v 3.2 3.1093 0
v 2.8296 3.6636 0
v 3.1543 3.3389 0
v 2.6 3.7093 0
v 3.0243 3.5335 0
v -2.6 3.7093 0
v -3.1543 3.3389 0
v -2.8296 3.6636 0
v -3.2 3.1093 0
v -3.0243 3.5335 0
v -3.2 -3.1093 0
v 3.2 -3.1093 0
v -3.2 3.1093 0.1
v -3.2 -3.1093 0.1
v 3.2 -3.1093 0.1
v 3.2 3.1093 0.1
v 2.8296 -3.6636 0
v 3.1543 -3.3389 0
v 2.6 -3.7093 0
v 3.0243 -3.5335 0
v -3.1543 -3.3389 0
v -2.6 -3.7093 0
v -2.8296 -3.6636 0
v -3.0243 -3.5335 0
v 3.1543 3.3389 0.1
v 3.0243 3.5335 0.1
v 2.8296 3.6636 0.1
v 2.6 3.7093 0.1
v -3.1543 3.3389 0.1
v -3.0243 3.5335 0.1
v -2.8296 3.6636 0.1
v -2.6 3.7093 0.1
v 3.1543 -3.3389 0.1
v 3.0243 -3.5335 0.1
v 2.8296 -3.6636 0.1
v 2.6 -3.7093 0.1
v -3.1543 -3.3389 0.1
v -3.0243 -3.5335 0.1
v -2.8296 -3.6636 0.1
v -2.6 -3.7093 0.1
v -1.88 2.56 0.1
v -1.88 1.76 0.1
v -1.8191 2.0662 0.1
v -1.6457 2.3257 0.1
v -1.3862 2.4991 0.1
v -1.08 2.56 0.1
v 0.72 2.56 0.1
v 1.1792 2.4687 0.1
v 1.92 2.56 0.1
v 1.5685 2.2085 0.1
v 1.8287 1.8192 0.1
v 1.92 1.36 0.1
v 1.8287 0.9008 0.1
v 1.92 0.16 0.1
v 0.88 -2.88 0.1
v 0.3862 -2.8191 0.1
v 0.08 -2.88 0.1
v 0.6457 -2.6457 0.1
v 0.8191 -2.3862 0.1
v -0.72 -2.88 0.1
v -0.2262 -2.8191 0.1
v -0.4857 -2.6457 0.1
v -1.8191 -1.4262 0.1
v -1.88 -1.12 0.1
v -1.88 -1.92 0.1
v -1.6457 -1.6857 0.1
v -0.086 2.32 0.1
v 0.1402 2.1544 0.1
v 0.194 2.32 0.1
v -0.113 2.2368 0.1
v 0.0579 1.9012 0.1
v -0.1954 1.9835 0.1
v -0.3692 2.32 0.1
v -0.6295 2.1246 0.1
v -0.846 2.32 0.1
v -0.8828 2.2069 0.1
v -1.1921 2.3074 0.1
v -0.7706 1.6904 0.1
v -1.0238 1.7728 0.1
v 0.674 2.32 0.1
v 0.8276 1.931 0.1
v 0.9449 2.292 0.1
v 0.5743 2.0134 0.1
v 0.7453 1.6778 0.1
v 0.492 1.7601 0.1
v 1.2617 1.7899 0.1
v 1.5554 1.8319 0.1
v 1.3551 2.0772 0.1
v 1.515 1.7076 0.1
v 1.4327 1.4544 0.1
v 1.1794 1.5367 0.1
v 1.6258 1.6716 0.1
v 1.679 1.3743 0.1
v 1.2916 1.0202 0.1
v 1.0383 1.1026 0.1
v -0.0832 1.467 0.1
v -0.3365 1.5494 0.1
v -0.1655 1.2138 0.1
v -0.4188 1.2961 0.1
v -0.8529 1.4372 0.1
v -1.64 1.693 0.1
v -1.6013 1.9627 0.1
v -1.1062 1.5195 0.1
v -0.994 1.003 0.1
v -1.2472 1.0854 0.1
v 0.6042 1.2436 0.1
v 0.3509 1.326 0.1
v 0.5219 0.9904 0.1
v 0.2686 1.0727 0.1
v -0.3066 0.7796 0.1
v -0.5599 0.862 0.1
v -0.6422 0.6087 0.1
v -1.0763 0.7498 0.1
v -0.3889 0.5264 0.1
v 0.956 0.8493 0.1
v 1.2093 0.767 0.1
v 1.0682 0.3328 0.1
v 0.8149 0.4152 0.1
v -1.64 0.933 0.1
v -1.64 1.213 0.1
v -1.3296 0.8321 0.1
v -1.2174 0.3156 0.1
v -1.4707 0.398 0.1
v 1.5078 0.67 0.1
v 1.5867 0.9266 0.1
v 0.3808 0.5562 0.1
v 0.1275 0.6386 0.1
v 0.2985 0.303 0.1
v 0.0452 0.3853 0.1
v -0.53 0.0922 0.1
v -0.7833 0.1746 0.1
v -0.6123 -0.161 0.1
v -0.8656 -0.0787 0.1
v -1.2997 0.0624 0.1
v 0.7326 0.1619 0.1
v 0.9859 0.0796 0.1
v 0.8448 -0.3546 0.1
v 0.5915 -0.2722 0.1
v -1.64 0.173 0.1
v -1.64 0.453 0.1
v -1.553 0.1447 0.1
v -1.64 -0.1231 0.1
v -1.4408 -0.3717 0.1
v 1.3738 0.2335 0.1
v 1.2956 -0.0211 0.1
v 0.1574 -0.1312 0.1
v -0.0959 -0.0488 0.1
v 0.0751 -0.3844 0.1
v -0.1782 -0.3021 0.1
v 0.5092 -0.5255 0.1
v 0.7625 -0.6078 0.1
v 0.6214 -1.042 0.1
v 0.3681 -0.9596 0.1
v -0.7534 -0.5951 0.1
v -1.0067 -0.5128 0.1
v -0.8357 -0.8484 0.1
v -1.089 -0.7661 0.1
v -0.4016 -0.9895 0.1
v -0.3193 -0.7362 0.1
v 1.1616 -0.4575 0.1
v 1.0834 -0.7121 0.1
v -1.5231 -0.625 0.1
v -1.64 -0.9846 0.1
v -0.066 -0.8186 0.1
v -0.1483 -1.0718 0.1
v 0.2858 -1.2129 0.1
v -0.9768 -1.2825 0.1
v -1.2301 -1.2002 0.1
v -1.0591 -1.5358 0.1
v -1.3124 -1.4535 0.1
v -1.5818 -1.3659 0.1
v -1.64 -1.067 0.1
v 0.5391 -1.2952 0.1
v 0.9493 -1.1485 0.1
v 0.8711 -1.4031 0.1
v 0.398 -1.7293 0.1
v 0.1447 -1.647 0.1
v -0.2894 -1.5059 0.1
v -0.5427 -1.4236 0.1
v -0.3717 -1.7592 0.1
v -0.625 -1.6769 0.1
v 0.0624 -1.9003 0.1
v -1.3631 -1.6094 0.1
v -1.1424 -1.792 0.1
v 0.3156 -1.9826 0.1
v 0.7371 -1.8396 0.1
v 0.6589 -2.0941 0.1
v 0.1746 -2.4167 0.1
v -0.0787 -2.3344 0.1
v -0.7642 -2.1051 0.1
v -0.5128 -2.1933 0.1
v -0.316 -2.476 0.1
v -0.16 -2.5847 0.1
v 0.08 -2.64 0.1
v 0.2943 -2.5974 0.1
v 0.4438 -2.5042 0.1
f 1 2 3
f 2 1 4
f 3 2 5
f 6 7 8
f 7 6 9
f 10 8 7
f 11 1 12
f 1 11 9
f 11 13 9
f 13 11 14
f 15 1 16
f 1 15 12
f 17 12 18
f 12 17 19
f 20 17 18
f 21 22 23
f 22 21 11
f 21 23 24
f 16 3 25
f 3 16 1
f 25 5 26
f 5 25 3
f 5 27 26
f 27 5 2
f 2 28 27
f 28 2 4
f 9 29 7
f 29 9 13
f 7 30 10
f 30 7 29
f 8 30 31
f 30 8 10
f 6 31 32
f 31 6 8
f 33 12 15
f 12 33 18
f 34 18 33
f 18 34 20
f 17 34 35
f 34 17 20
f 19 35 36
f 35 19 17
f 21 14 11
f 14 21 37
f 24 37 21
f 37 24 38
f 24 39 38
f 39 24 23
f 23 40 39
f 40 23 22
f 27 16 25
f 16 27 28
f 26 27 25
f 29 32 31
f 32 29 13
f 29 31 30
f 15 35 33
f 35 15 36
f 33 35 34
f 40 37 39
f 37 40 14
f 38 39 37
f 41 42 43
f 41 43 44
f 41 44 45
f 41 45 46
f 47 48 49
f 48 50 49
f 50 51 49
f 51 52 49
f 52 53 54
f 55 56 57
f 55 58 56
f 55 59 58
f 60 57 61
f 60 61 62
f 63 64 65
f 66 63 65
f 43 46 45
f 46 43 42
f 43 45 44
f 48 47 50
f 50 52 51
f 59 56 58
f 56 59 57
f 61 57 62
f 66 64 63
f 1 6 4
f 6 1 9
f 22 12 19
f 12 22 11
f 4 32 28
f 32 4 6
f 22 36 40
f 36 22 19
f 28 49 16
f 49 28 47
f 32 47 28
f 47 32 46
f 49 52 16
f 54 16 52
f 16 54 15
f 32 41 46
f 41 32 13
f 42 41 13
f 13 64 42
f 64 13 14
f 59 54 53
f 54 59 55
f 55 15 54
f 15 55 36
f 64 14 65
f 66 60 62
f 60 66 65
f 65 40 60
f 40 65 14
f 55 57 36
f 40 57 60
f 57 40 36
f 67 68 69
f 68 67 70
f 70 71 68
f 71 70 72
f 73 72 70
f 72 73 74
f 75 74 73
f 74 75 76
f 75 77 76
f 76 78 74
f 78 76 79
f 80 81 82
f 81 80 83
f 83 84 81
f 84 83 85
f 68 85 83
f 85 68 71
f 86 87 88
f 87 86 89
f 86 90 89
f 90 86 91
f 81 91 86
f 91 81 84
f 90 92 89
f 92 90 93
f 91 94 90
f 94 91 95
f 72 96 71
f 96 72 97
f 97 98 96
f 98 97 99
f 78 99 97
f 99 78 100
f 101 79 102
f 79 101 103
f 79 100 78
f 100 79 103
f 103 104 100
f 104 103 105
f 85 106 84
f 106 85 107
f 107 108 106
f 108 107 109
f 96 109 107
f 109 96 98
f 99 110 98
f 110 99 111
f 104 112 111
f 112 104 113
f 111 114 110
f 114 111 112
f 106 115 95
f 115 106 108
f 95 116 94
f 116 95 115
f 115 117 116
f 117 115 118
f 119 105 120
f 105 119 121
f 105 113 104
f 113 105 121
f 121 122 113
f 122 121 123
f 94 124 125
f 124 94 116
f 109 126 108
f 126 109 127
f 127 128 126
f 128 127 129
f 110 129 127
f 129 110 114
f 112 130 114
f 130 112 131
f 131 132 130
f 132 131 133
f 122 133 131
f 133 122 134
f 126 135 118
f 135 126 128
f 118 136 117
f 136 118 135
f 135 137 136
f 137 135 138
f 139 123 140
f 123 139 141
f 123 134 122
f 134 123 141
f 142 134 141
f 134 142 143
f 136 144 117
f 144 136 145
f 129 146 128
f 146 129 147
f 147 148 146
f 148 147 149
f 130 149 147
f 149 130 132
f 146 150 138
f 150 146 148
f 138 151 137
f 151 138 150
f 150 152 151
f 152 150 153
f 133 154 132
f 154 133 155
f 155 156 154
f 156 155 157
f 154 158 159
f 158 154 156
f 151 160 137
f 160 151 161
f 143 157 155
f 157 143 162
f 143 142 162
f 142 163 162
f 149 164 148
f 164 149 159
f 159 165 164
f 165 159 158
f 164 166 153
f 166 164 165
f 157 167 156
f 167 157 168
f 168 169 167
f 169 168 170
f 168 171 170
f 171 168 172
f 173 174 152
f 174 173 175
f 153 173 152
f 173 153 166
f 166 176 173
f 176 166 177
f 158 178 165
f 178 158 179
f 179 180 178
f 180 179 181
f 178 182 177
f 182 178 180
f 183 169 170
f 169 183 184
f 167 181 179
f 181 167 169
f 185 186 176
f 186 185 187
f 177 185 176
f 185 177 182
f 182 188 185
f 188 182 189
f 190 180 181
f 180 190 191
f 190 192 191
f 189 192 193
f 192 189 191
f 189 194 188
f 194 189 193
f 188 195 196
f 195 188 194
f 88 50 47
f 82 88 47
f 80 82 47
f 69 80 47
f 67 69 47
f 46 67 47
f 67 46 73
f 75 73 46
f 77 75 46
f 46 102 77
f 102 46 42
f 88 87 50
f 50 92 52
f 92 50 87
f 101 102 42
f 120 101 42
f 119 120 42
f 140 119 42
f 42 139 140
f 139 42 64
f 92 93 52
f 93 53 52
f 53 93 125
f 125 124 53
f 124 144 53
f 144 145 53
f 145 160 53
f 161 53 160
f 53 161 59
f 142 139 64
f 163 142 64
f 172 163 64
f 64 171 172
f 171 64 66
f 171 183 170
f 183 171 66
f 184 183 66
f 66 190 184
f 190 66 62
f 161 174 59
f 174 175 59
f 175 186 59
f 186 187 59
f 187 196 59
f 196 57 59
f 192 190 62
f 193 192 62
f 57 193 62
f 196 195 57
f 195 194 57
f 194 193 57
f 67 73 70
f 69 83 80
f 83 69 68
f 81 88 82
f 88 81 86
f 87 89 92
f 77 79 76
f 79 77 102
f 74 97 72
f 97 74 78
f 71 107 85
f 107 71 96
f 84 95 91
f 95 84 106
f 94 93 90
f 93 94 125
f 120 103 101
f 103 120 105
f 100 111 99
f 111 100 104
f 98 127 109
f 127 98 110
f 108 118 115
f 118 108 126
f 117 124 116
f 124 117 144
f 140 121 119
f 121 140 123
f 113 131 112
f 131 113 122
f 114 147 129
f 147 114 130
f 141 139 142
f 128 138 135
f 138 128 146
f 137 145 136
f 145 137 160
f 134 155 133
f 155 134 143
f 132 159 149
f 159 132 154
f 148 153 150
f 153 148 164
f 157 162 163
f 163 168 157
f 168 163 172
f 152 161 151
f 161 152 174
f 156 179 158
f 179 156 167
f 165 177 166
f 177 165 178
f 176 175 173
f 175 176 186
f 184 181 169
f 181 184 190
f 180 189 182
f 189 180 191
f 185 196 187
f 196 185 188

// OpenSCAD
// file: ../p/empty.scad
use <../lib.scad>
function ldraw_lib__empty() = [
// 0 Empty
// 0 Name: empty.dat
// 0 Author: Steffen [Steffen]
// 0 !LDRAW_ORG Primitive UPDATE 2015-01
// 0 !LICENSE Licensed under CC BY 4.0 : see CAreadme.txt
// 
// 0 BFC CERTIFY CCW
  [0,"BFC","CERTIFY"],
  [0,"BFC","CCW"],
// 
// 0 !HISTORY 2015-10-11 [PTadmin] Official Update 2015-01
// 
// 
// 0 // // Tool MLCad cannot handle really empty files. This file is used as a workaround.
// 0 // // It exceptionally contains forbidden non-LDRAW standard syntax to satisfy MLCad until it is fixed OR a different editor has become the de-facto LDRAW standard.
// 0 // // The line being used here is an "impossible" conditional line which never should be visible,
// 0 // // additionally hidden by a syntax explicitly hiding it from displaying.
// 
// 0 // MLCAD HIDE 5 24 0 0 0 0.0001 0 0 0.0001 -0.0001 0 0 0 0
];
module ldraw_lib__empty(step=0, col=false, unit=2/5, alt=false, line=0.2, solid=!$preview)
    makepoly(ldraw_lib__empty(), step=step, col=col, unit=unit, alt=alt, line=line, solid=solid);
ldraw_lib__empty(line=0.2);
// file: ../p/box3u12.scad
use <../lib.scad>
function ldraw_lib__box3u12() = [
// 0 Box with 3 Parallel Faces without Any Edges
// 0 Name: box3u12.dat
// 0 Author: J.C. Tchang [tchang]
// 0 !LDRAW_ORG Primitive UPDATE 2014-02
// 0 !LICENSE Licensed under CC BY 4.0 : see CAreadme.txt
// 
// 0 BFC CERTIFY CCW
  [0,"BFC","CERTIFY"],
  [0,"BFC","CCW"],
// 
// 0 !HISTORY 2014-12-23 [PTadmin] Official Update 2014-02
// 
// 
// 4 16 -1 1 1 1 1 1 1 1 -1 -1 1 -1
  [4,16,-1,1,1,1,1,1,1,1,-1,-1,1,-1],
// 4 16 -1 1 1 -1 0 1 1 0 1 1 1 1
  [4,16,-1,1,1,-1,0,1,1,0,1,1,1,1],
// 4 16 1 1 -1 1 0 -1 -1 0 -1 -1 1 -1
  [4,16,1,1,-1,1,0,-1,-1,0,-1,-1,1,-1],
];
module ldraw_lib__box3u12(step=0, col=false, unit=2/5, alt=false, line=0.2, solid=!$preview)
    makepoly(ldraw_lib__box3u12(), step=step, col=col, unit=unit, alt=alt, line=line, solid=solid);
ldraw_lib__box3u12(line=0.2);
// file: ../p/5-16ndis.scad
use <../lib.scad>
function ldraw_lib__5_16ndis() = [
// 0 Disc Negative 0.3125
// 0 Name: 5-16ndis.dat
// 0 Author: Max Martin Richter [MMR1988]
// 0 !LDRAW_ORG Primitive UPDATE 2013-01
// 0 !LICENSE Licensed under CC BY 4.0 : see CAreadme.txt
// 
// 0 BFC CERTIFY CCW
  [0,"BFC","CERTIFY"],
  [0,"BFC","CCW"],
// 
// 0 !HISTORY 2013-07-21 [PTadmin] Official Update 2013-01
// 
// 
// 3 16 1 0 1 0.9239 0 0.3827 1 0 0
  [3,16,1,0,1,0.9239,0,0.3827,1,0,0],
// 3 16 1 0 1 0.7071 0 0.7071 0.9239 0 0.3827
  [3,16,1,0,1,0.7071,0,0.7071,0.9239,0,0.3827],
// 3 16 1 0 1 0.3827 0 0.9239 0.7071 0 0.7071
  [3,16,1,0,1,0.3827,0,0.9239,0.7071,0,0.7071],
// 3 16 1 0 1 0 0 1 0.3827 0 0.9239
  [3,16,1,0,1,0,0,1,0.3827,0,0.9239],
// 3 16 -1 0 1 -0.3827 0 0.9239 0 0 1
  [3,16,-1,0,1,-0.3827,0,0.9239,0,0,1],
// 0 // Build by Primitive Generator 2
];
module ldraw_lib__5_16ndis(step=0, col=false, unit=2/5, alt=false, line=0.2, solid=!$preview)
    makepoly(ldraw_lib__5_16ndis(), step=step, col=col, unit=unit, alt=alt, line=line, solid=solid);
ldraw_lib__5_16ndis(line=0.2);
// file: ../p/3-16ndis.scad
use <../lib.scad>
function ldraw_lib__3_16ndis() = [
// 0 Disc Negative 0.1875
// 0 Name: 3-16ndis.dat
// 0 Author: Magnus Forsberg [MagFors]
// 0 !LDRAW_ORG Primitive UPDATE 2024-01
// 0 !LICENSE Licensed under CC BY 4.0 : see CAreadme.txt
// 
// 0 BFC CERTIFY CCW
  [0,"BFC","CERTIFY"],
  [0,"BFC","CCW"],
// 
// 0 !HISTORY 2009-05-02 [PTadmin] Official Update 2009-01
// 0 !HISTORY 2024-01-03 [MagFors] Complete regeneration, original by guyvivan
// 0 !HISTORY 2024-01-29 [OrionP] Official Update 2024-01
// 
// 3 16 1 0 1 0.9239 0 0.3827 1 0 0
  [3,16,1,0,1,0.9239,0,0.3827,1,0,0],
// 3 16 1 0 1 0.7071 0 0.7071 0.9239 0 0.3827
  [3,16,1,0,1,0.7071,0,0.7071,0.9239,0,0.3827],
// 3 16 1 0 1 0.3827 0 0.9239 0.7071 0 0.7071
  [3,16,1,0,1,0.3827,0,0.9239,0.7071,0,0.7071],
// 0 // Build by LDPartEditor (PrimGen 2.X)
];
module ldraw_lib__3_16ndis(step=0, col=false, unit=2/5, alt=false, line=0.2, solid=!$preview)
    makepoly(ldraw_lib__3_16ndis(), step=step, col=col, unit=unit, alt=alt, line=line, solid=solid);
ldraw_lib__3_16ndis(line=0.2);
// file: ../p/3-16chrd.scad
use <../lib.scad>
function ldraw_lib__3_16chrd() = [
// 0 Chord 0.1875
// 0 Name: 3-16chrd.dat
// 0 Author: Niels Karsdorp [nielsk]
// 0 !LDRAW_ORG Primitive UPDATE 2009-01
// 0 !LICENSE Licensed under CC BY 4.0 : see CAreadme.txt
// 
// 0 BFC CERTIFY CCW
  [0,"BFC","CERTIFY"],
  [0,"BFC","CCW"],
// 
// 0 !HISTORY 2009-05-02 [PTadmin] Official Update 2009-01
// 
// 
// 4 16 1 0 0 0.9239 0 0.3827 0.7071 0 0.7071 0.3827 0 0.9239
  [4,16,1,0,0,0.9239,0,0.3827,0.7071,0,0.7071,0.3827,0,0.9239],
// 0
// 
];
module ldraw_lib__3_16chrd(step=0, col=false, unit=2/5, alt=false, line=0.2, solid=!$preview)
    makepoly(ldraw_lib__3_16chrd(), step=step, col=col, unit=unit, alt=alt, line=line, solid=solid);
ldraw_lib__3_16chrd(line=0.2);
// file: ../p/1-8ndis.scad
use <../lib.scad>
function ldraw_lib__1_8ndis() = [
// 0 Disc Negative 0.125
// 0 Name: 1-8ndis.dat
// 0 Author: James Jessiman
// 0 !LDRAW_ORG Primitive UPDATE 2012-01
// 0 !LICENSE Licensed under CC BY 4.0 : see CAreadme.txt
// 
// 0 BFC CERTIFY CCW
  [0,"BFC","CERTIFY"],
  [0,"BFC","CCW"],
// 
// 0 !HISTORY 2002-03-23 [sbliss] Added BFC statement
// 0 !HISTORY 2002-04-25 [PTadmin] Official Update 2002-02
// 0 !HISTORY 2007-06-22 [PTadmin] Header formatted for Contributor Agreement
// 0 !HISTORY 2008-07-01 [PTadmin] Official Update 2008-01
// 0 !HISTORY 2012-02-16 [Philo] Changed to CCW
// 0 !HISTORY 2012-03-30 [PTadmin] Official Update 2012-01
// 
// 
// 3 16 0.9239 0 0.3827 1 0 0 1 0 1
  [3,16,0.9239,0,0.3827,1,0,0,1,0,1],
// 3 16 0.7071 0 0.7071 0.9239 0 0.3827 1 0 1
  [3,16,0.7071,0,0.7071,0.9239,0,0.3827,1,0,1],
];
module ldraw_lib__1_8ndis(step=0, col=false, unit=2/5, alt=false, line=0.2, solid=!$preview)
    makepoly(ldraw_lib__1_8ndis(), step=step, col=col, unit=unit, alt=alt, line=line, solid=solid);
ldraw_lib__1_8ndis(line=0.2);
// file: ../p/1-8chrd.scad
use <../lib.scad>
function ldraw_lib__1_8chrd() = [
// 0 Chord 0.125
// 0 Name: 1-8chrd.dat
// 0 Author: Orion Pobursky [OrionP]
// 0 !LDRAW_ORG Primitive UPDATE 2023-05
// 0 !LICENSE Licensed under CC BY 4.0 : see CAreadme.txt
// 
// 0 BFC CERTIFY CCW
  [0,"BFC","CERTIFY"],
  [0,"BFC","CCW"],
// 
// 0 !HISTORY 2004-04-22 [PTadmin] Official Update 2004-02
// 0 !HISTORY 2007-06-22 [PTadmin] Header formatted for Contributor Agreement
// 0 !HISTORY 2008-07-01 [PTadmin] Official Update 2008-01
// 0 !HISTORY 2023-10-27 [OrionP] Rebuilt with PrimGen2, original author westrate
// 0 !HISTORY 2023-10-31 [OrionP] Official Update 2023-05
// 
// 3 16 1 0 0 0.9239 0 0.3827 0.7071 0 0.7071
  [3,16,1,0,0,0.9239,0,0.3827,0.7071,0,0.7071],
];
module ldraw_lib__1_8chrd(step=0, col=false, unit=2/5, alt=false, line=0.2, solid=!$preview)
    makepoly(ldraw_lib__1_8chrd(), step=step, col=col, unit=unit, alt=alt, line=line, solid=solid);
ldraw_lib__1_8chrd(line=0.2);
// file: ../p/1-4ndis.scad
use <../lib.scad>
function ldraw_lib__1_4ndis() = [
// 0 Disc Negative 0.25
// 0 Name: 1-4ndis.dat
// 0 Author: James Jessiman
// 0 !LDRAW_ORG Primitive UPDATE 2012-01
// 0 !LICENSE Licensed under CC BY 4.0 : see CAreadme.txt
// 
// 0 BFC CERTIFY CCW
  [0,"BFC","CERTIFY"],
  [0,"BFC","CCW"],
// 
// 0 !HISTORY 2002-03-23 [sbliss] Added BFC Statement
// 0 !HISTORY 2002-04-25 [PTadmin] Official Update 2002-02
// 0 !HISTORY 2007-06-22 [PTadmin] Header formatted for Contributor Agreement
// 0 !HISTORY 2008-07-01 [PTadmin] Official Update 2008-01
// 0 !HISTORY 2012-02-16 [Philo] Changed to CCW
// 0 !HISTORY 2012-03-30 [PTadmin] Official Update 2012-01
// 
// 
// 3 16 0.9239 0 0.3827 1 0 0 1 0 1
  [3,16,0.9239,0,0.3827,1,0,0,1,0,1],
// 3 16 0.7071 0 0.7071 0.9239 0 0.3827 1 0 1
  [3,16,0.7071,0,0.7071,0.9239,0,0.3827,1,0,1],
// 3 16 0.3827 0 0.9239 0.7071 0 0.7071 1 0 1
  [3,16,0.3827,0,0.9239,0.7071,0,0.7071,1,0,1],
// 3 16 0 0 1 0.3827 0 0.9239 1 0 1
  [3,16,0,0,1,0.3827,0,0.9239,1,0,1],
];
module ldraw_lib__1_4ndis(step=0, col=false, unit=2/5, alt=false, line=0.2, solid=!$preview)
    makepoly(ldraw_lib__1_4ndis(), step=step, col=col, unit=unit, alt=alt, line=line, solid=solid);
ldraw_lib__1_4ndis(line=0.2);
// file: ../p/1-4cyli.scad
use <../lib.scad>
function ldraw_lib__1_4cyli() = [
// 0 Cylinder 0.25
// 0 Name: 1-4cyli.dat
// 0 Author: James Jessiman
// 0 !LDRAW_ORG Primitive UPDATE 2012-01
// 0 !LICENSE Licensed under CC BY 4.0 : see CAreadme.txt
// 
// 0 BFC CERTIFY CCW
  [0,"BFC","CERTIFY"],
  [0,"BFC","CCW"],
// 
// 0 !HISTORY 2002-03-23 [sbliss] Added BFC statement.
// 0 !HISTORY 2002-04-25 [PTadmin] Official Update 2002-02
// 0 !HISTORY 2007-06-22 [PTadmin] Header formatted for Contributor Agreement
// 0 !HISTORY 2008-07-01 [PTadmin] Official Update 2008-01
// 0 !HISTORY 2012-02-16 [Philo] Changed to CCW
// 0 !HISTORY 2012-03-30 [PTadmin] Official Update 2012-01
// 
// 
// 4 16 1 1 0 0.9239 1 0.3827 0.9239 0 0.3827 1 0 0
  [4,16,1,1,0,0.9239,1,0.3827,0.9239,0,0.3827,1,0,0],
// 5 24 1 0 0 1 1 0 0.9239 0 0.3827 1 0 -1
  [5,24,1,0,0,1,1,0,0.9239,0,0.3827,1,0,-1],
// 4 16 0.9239 1 0.3827 0.7071 1 0.7071 0.7071 0 0.7071 0.9239 0 0.3827
  [4,16,0.9239,1,0.3827,0.7071,1,0.7071,0.7071,0,0.7071,0.9239,0,0.3827],
// 5 24 0.9239 0 0.3827 0.9239 1 0.3827 0.7071 0 0.7071 1 0 0
  [5,24,0.9239,0,0.3827,0.9239,1,0.3827,0.7071,0,0.7071,1,0,0],
// 4 16 0.7071 1 0.7071 0.3827 1 0.9239 0.3827 0 0.9239 0.7071 0 0.7071
  [4,16,0.7071,1,0.7071,0.3827,1,0.9239,0.3827,0,0.9239,0.7071,0,0.7071],
// 5 24 0.7071 0 0.7071 0.7071 1 0.7071 0.3827 0 0.9239 0.9239 0 0.3827
  [5,24,0.7071,0,0.7071,0.7071,1,0.7071,0.3827,0,0.9239,0.9239,0,0.3827],
// 4 16 0.3827 1 0.9239 0 1 1 0 0 1 0.3827 0 0.9239
  [4,16,0.3827,1,0.9239,0,1,1,0,0,1,0.3827,0,0.9239],
// 5 24 0.3827 0 0.9239 0.3827 1 0.9239 0 0 1 0.7071 0 0.7071
  [5,24,0.3827,0,0.9239,0.3827,1,0.9239,0,0,1,0.7071,0,0.7071],
// 5 24 0 0 1 0 1 1 0.3827 0 0.9239 -1 0 1
  [5,24,0,0,1,0,1,1,0.3827,0,0.9239,-1,0,1],
];
module ldraw_lib__1_4cyli(step=0, col=false, unit=2/5, alt=false, line=0.2, solid=!$preview)
    makepoly(ldraw_lib__1_4cyli(), step=step, col=col, unit=unit, alt=alt, line=line, solid=solid);
ldraw_lib__1_4cyli(line=0.2);
// file: ../p/1-4chrd.scad
use <../lib.scad>
function ldraw_lib__1_4chrd() = [
// 0 Chord 0.25
// 0 Name: 1-4chrd.dat
// 0 Author: Max Martin Richter [MMR1988]
// 0 !LDRAW_ORG Primitive UPDATE 2023-05
// 0 !LICENSE Licensed under CC BY 4.0 : see CAreadme.txt
// 
// 0 BFC CERTIFY CCW
  [0,"BFC","CERTIFY"],
  [0,"BFC","CCW"],
// 
// 0 !HISTORY 2004-04-22 [PTadmin] Official Update 2004-02
// 0 !HISTORY 2007-10-09 [PTadmin] Header formatted for Contributor Agreement
// 0 !HISTORY 2008-07-01 [PTadmin] Official Update 2008-01
// 0 !HISTORY 2012-08-02 [MMR1988] Re-creation with PrimGen2 and Rectifier
// 0 !HISTORY 2012-08-09 [PTadmin] Official Update 2012-02
// 0 !HISTORY 2023-10-27 [OrionP] Change author to MMR1988 from hafhead
// 0 !HISTORY 2023-10-31 [OrionP] Official Update 2023-05
// 
// 4 16 0.9239 0 0.3827 0.3827 0 0.9239 0 0 1 1 0 0
  [4,16,0.9239,0,0.3827,0.3827,0,0.9239,0,0,1,1,0,0],
// 3 16 0.7071 0 0.7071 0.3827 0 0.9239 0.9239 0 0.3827
  [3,16,0.7071,0,0.7071,0.3827,0,0.9239,0.9239,0,0.3827],
];
module ldraw_lib__1_4chrd(step=0, col=false, unit=2/5, alt=false, line=0.2, solid=!$preview)
    makepoly(ldraw_lib__1_4chrd(), step=step, col=col, unit=unit, alt=alt, line=line, solid=solid);
ldraw_lib__1_4chrd(line=0.2);
// file: ../p/1-16chrd.scad
use <../lib.scad>
use <empty.scad>
function ldraw_lib__1_16chrd() = [
// 0 Chord 0.0625
// 0 Name: 1-16chrd.dat
// 0 Author: Philippe Hurbain [Philo]
// 0 !LDRAW_ORG Primitive UPDATE 2015-01
// 0 !LICENSE Licensed under CC BY 4.0 : see CAreadme.txt
// 
// 0 BFC CERTIFY CCW
  [0,"BFC","CERTIFY"],
  [0,"BFC","CCW"],
// 
// 0 !HISTORY 2015-10-11 [PTadmin] Official Update 2015-01
// 
// 
// 0 // This file is intentionally empty because at the current \P resolution,
// 0 // an 1-16chrd is actually empty. However, this file still is present
// 0 // to allow tools to do primitives substition and fill in a real chrd here,
// 0 // or, if desired, to substitute this with the hi-res 48\1-16chrd.
// 
// 0 // This file is based on an idea by Darats at http://forums.ldraw.org/read.php?19,14500,14500#msg-14500
// 
// 1 16 0 0 0 1 0 0 0 1 0 0 0 1 empty.dat
  [1,16,0,0,0,1,0,0,0,1,0,0,0,1, ldraw_lib__empty()],
];
module ldraw_lib__1_16chrd(step=0, col=false, unit=2/5, alt=false, line=0.2, solid=!$preview)
    makepoly(ldraw_lib__1_16chrd(), step=step, col=col, unit=unit, alt=alt, line=line, solid=solid);
ldraw_lib__1_16chrd(line=0.2);
// main file
use <../lib.scad>
use <6177741i.scad>
function ldraw_lib__6177741l() = [
// 0 Sticker  0.9 x  0.8 with Black Grille on Transparent Background Left
// 0 Name: 6177741l.dat
// 0 Author: Massimo Maso [Sirio]
// 0 !LDRAW_ORG Part UPDATE 2025-05
// 0 !LICENSE Licensed under CC BY 4.0 : see CAreadme.txt
// 
// 0 BFC CERTIFY CCW
  [0,"BFC","CERTIFY"],
  [0,"BFC","CCW"],
// 
// 0 !KEYWORDS AMG, GT3, Mercedes, Set 75877, Speed Champions
// 
// 0 !HISTORY 2025-05-28 [OrionP] Official Update 2025-05
// 
// 
// 1 16 0 0 0 -1 0 0 0 1 0 0 0 1 6177741i.dat
  [1,16,0,0,0,-1,0,0,0,1,0,0,0,1, ldraw_lib__6177741i()],
];
module ldraw_lib__6177741l(step=0, col=false, unit=2/5, alt=false, line=0.2, solid=!$preview)
    makepoly(ldraw_lib__6177741l(), step=step, col=col, unit=unit, alt=alt, line=line, solid=solid);
ldraw_lib__6177741l(line=0.2);
